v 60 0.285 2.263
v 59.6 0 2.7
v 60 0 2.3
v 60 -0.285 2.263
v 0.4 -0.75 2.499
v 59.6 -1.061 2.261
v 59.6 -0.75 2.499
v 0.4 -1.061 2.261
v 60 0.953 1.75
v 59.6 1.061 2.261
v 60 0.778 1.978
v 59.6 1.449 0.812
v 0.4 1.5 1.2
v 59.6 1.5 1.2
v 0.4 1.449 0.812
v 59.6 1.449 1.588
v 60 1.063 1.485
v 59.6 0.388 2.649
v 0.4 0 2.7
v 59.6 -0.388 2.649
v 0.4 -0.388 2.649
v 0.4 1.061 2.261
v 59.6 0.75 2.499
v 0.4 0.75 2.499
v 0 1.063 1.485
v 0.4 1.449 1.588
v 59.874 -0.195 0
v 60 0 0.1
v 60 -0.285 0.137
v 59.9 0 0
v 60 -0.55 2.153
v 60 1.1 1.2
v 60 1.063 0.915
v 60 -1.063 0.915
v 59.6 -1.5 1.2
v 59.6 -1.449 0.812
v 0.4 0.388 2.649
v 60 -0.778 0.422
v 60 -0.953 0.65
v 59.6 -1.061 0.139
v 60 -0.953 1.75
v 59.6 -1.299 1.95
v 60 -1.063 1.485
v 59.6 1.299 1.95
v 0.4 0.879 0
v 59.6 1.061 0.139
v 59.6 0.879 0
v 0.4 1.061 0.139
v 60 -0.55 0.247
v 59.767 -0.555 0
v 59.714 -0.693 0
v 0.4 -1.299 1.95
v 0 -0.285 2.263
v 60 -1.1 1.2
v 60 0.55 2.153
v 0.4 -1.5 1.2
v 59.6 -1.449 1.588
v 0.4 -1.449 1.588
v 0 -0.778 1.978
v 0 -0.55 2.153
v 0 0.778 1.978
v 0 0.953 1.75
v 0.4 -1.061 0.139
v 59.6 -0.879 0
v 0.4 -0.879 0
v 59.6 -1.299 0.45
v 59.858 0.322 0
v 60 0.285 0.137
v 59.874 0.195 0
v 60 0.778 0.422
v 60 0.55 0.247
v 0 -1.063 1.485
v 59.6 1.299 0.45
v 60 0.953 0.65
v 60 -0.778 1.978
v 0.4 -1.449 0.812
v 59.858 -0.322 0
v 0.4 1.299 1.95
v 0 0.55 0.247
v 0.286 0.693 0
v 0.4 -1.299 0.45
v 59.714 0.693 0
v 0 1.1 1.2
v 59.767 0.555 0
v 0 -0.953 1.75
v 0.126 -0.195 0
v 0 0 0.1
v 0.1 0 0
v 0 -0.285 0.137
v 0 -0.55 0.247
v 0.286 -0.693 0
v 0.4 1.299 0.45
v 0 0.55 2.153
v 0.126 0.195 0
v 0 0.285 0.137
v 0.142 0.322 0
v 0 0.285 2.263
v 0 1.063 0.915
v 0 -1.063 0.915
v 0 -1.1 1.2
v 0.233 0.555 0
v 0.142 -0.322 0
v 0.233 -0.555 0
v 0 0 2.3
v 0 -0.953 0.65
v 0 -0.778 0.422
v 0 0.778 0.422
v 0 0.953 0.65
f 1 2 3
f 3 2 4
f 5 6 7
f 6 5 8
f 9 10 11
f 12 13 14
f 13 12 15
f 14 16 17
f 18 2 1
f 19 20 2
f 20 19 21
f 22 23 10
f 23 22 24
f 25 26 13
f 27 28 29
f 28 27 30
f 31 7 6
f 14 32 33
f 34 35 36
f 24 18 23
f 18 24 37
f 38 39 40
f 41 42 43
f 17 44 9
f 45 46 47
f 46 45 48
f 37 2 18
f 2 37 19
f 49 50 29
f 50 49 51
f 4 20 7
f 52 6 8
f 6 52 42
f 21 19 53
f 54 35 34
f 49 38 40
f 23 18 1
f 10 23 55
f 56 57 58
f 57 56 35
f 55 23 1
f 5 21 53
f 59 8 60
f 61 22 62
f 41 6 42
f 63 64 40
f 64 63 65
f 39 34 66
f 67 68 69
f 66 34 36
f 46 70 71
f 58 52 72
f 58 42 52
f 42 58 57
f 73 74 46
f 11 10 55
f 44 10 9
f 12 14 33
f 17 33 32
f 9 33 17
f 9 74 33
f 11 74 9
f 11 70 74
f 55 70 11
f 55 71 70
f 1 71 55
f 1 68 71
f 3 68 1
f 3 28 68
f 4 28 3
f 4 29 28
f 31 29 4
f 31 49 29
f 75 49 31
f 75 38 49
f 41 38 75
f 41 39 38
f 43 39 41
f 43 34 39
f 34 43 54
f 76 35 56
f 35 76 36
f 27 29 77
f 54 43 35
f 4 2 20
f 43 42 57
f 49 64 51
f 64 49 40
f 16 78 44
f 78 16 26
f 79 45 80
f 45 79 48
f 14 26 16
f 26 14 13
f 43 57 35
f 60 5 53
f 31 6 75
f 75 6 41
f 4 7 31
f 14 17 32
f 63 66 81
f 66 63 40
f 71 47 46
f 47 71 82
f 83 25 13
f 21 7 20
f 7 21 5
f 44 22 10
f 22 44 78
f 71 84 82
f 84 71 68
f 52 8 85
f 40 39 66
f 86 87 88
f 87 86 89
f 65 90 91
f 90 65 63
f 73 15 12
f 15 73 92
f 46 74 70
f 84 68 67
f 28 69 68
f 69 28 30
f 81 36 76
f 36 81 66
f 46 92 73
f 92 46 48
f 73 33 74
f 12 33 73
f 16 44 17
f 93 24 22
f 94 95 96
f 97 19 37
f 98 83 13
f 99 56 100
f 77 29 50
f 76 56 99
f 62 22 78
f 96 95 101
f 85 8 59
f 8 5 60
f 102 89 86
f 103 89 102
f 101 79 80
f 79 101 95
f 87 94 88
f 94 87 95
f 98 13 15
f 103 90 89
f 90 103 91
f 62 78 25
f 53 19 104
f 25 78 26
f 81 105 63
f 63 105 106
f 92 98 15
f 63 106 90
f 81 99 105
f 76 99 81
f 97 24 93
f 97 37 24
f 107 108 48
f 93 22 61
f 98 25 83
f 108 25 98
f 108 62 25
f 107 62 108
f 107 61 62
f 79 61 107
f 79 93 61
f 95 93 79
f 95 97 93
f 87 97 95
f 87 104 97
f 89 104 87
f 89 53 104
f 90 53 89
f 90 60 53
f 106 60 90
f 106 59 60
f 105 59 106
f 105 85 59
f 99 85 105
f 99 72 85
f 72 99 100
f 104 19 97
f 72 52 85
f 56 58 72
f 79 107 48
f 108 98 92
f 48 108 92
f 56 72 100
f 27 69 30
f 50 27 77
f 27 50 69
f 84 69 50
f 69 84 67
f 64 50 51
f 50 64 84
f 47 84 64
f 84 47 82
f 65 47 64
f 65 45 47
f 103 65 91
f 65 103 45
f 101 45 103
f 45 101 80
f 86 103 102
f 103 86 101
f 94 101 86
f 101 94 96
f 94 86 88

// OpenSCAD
// file: ../stem_core.scad
// =====================================================================
//  stem_core.scad — shared geometry helpers for every STEM_KIT part.
// =====================================================================
include <../PARAMETERS/config.scad>
// =====================================================================

// ---------- rounded / chamfered prisms --------------------------------

// Rounded rectangle (2D), centred.
module rrect(size, r) {
    rr = min(r, min(size[0], size[1]) / 2 - 0.01);
    offset(r = rr) square([size[0] - 2 * rr, size[1] - 2 * rr], center = true);
}

// Box with rounded vertical edges, chamfered bottom edge (elephant-foot
// relief) and rounded-ish (chamfered) top edge. Sits on z = 0, centred XY.
module rbox(size, r = 2, top = edge_r, bottom = chamfer) {
    h = size[2];
    hull() {
        linear_extrude(0.01) rrect([size[0] - 2 * bottom, size[1] - 2 * bottom], max(r - bottom, 0.1));
        translate([0, 0, bottom]) linear_extrude(h - bottom - top) rrect([size[0], size[1]], r);
        translate([0, 0, h - 0.01]) linear_extrude(0.01) rrect([size[0] - 2 * top, size[1] - 2 * top], max(r - top, 0.1));
    }
}

// Cylinder with chamfered/rounded top and bottom edges (safe hubs, knobs).
module rcyl(d, h, top = edge_r, bottom = chamfer) {
    rotate_extrude() polygon([
        [0, 0], [d / 2 - bottom, 0], [d / 2, bottom],
        [d / 2, h - top], [d / 2 - top, h], [0, h]
    ]);
}

// Stadium (slot / rounded bar) 2D between two points on the X axis.
module stadium2d(len, w) {
    hull() { circle(d = w); translate([len, 0]) circle(d = w); }
}

// ---------- holes ------------------------------------------------------

// Vertical through hole with small top/bottom chamfers.
module vhole(d = grid_hole_d, h = 50, ch = 0.4) {
    translate([0, 0, -h / 2]) cylinder(d = d, h = h);
}

// Horizontal hole along +Y, printable without supports (teardrop tip up).
module teardrop_y(d, len, center = true) {
    translate([0, center ? -len / 2 : 0, 0]) rotate([-90, 0, 0])
        linear_extrude(len) teardrop2d(d);
}
module teardrop_x(d, len, center = true) {
    translate([center ? -len / 2 : 0, 0, 0]) rotate([0, 90, 0]) rotate([0, 0, -90])
        linear_extrude(len) teardrop2d(d);
}
// 2D teardrop: circle + 45° roof pointing "up" in the final part (+Z).
// After rotate([-90,0,0]) local +Y becomes -Z, so the roof points to -Y here.
module teardrop2d(d) {
    r = d / 2;
    union() {
        circle(d = d);
        polygon([[-r * sqrt(2) / 2, -r * sqrt(2) / 2], [0, -r * sqrt(2)], [r * sqrt(2) / 2, -r * sqrt(2) / 2]]);
    }
}

// Hex nut pocket (flat sides parallel to X), opening at z = 0 going +Z.
module nut_pocket(depth = nut_pocket_depth, af = nut_pocket_af) {
    cylinder(d = af / cos(30), h = depth, $fn = 6);
}

// Side-entry nut slot: nut plane is XY, slot opens toward +dir (X).
// Centred on the screw axis (Z), slot height nut_slot_t, runs out `len`.
module nut_slot_x(len = 10, af = nut_pocket_af, t = nut_slot_t) {
    translate([0, 0, -t / 2]) hull() {
        cylinder(d = af / cos(30), h = t, $fn = 6);
        translate([len, 0, 0]) cylinder(d = af / cos(30), h = t, $fn = 6);
    }
}

// Counterbored clearance hole from top surface at height `top` downward.
module cbore(top, depth, d = counterbore_d) {
    translate([0, 0, top - depth]) cylinder(d = d, h = depth + 20);
    translate([0, 0, -20]) cylinder(d = grid_hole_d, h = top + 40);
}

// Grid of vertical holes: nx x ny, pitch grid_pitch, first hole centred
// at `origin` (XY). Used by every plate.
module grid_holes(nx, ny, origin = [0, 0], h = 100, d = grid_hole_d) {
    for (i = [0 : nx - 1], j = [0 : ny - 1])
        translate([origin[0] + i * grid_pitch, origin[1] + j * grid_pitch, 0]) vhole(d, h);
}

// Slot (for adjustable mounting) along X, length = travel.
module slot_x(travel, d = grid_hole_d, h = 100) {
    translate([-travel / 2, 0, -h / 2]) linear_extrude(h) stadium2d(travel, d);
}

// ---------- shaft bores ------------------------------------------------

// 2D bore profile: round, or D if shaft_flat > 0.
module bore2d(d) {
    if (shaft_flat > 0)
        intersection() { circle(d = d); translate([-d, -d / 2]) square([2 * d, d - shaft_flat + (d - shaft_diameter) / 2]); }
    else circle(d = d);
}

// Standard HUB: cylinder hub_d x hub_h standing on z = z0, with bore,
// radial M3 set screw at mid height and a captive-nut slot from the top.
// Call inside difference() for the cut-outs: hub_body()/hub_cuts().
module hub_body(z0, d = hub_d, h = hub_h) {
    translate([0, 0, z0]) rcyl(d, h, top = 0.8, bottom = 0);
}
module hub_cuts(z0, total_h, d = hub_d, h = hub_h, bore = shaft_fixed_bore, set_screw = true, screw_angle = 0) {
    // bore through everything
    translate([0, 0, -1]) linear_extrude(total_h + 2) bore2d(bore);
    // entry chamfer on bore
    translate([0, 0, total_h - 0.6]) cylinder(d1 = bore, d2 = bore + 1.2, h = 0.61);
    translate([0, 0, -0.01]) cylinder(d1 = bore + 1.2, d2 = bore, h = 0.6);
    if (set_screw) rotate([0, 0, screw_angle]) {
        zs = z0 + h / 2;
        // radial screw hole (teardrop, prints without support)
        translate([0, 0, zs]) teardrop_x(screw_clear_d, d, center = false);
        // captive nut slot, entered from the hub top face
        nr = bore / 2 + (d / 2 - bore / 2) / 2;       // radial position of nut
        translate([nr - nut_slot_t / 2, -nut_pocket_af / 2, zs - nut_pocket_af / cos(30) / 2 - 0.1])
            cube([nut_slot_t, nut_pocket_af, total_h + 10]);   // open to the hub top face
    }
}

// ---------- labels -----------------------------------------------------

// Engrave text into a top surface at height z (depth 0.6 = 3 layers).
module engrave(txt, size = 5, z = 0, depth = 0.6, halign = "center") {
    translate([0, 0, z - depth]) linear_extrude(depth + 1)
        text(txt, size = size, font = "Liberation Sans:style=Bold", halign = halign, valign = "center");
}

// ---------- misc -------------------------------------------------------

function grid_snap(v) = ceil(v / grid_pitch) * grid_pitch;
// file: ../../PARAMETERS/config.scad
// =====================================================================
//  STEM_KIT — CENTRAL PARAMETER FILE  ("ForgeGrid" mechanical standard)
// ---------------------------------------------------------------------
//  Every part in the library includes this file. Change a value here,
//  run `python3 tools/build.py`, and the whole library regenerates.
//  All dimensions in millimetres.
// =====================================================================

// ---------------------------------------------------------------------
// 1. PRINTER / PROCESS
// ---------------------------------------------------------------------
nozzle          = 0.4;
layer_height    = 0.2;
tolerance       = 0.2;    // sliding clearance per side (tune with STEM_TOLERANCE_TEST)
press_allow     = 0.05;   // extra for press fits (bores that should grip)
min_wall        = 1.6;    // never go below this
wall_thickness  = 2.4;    // preferred wall (6 perimeters @ 0.4)
edge_r          = 1.0;    // rounding of exposed edges (child safety)
chamfer         = 0.6;    // bottom-edge chamfer (elephant-foot relief)

$fa = 6;                  // facet angle
$fs = 0.4;                // facet size

// ---------------------------------------------------------------------
// 2. GRID  (the heart of the ecosystem)
// ---------------------------------------------------------------------
//  Holes sit on a 10 mm lattice, 5 mm in from every plate edge, so
//  plates placed side by side keep one continuous lattice.
grid_pitch            = 10;
plate_size            = 100;   // universal base plate (square)
plate_thickness       = 6;     // base plates, rails, chassis
foot_thickness        = 4;     // flange / foot of every mount
//  => standard joint: 4 mm foot + 6 mm plate = M3 x 10 screw, nut in
//     the hex pocket under the plate. One screw length does 90 % of joints.

// ---------------------------------------------------------------------
// 3. FASTENERS (M3 everywhere: one screwdriver, one nut)
// ---------------------------------------------------------------------
screw_size            = 3;
screw_clear_d         = 3.4;   // clearance hole (also the grid hole)
grid_hole_d           = screw_clear_d;
screw_tap_d           = 2.6;   // hole a screw self-taps into
screw_head_d          = 5.7;   // ISO 7380 BUTTON head = kit standard (low, rounded, child-safe)
screw_head_h          = 1.65;
counterbore_d         = 6.4;
nut_af                = 5.5;   // M3 nut across flats
nut_thick             = 2.4;
nut_pocket_af         = nut_af + 0.35;
nut_pocket_depth      = 3.0;   // pocket under plates (nut sits flush)
nut_slot_t            = nut_thick + 0.4;  // side-entry slot thickness
set_screw_len         = 6;     // M3 x 6 grub screw for hubs

// ---------------------------------------------------------------------
// 4. SHAFTS
// ---------------------------------------------------------------------
//  Default: 3 mm steel rod (silver steel / stainless). Printed shafts
//  are provided for light-duty use. Alternative systems: set
//  shaft_diameter = 4 or 5 and rebuild.
shaft_diameter        = 3;
shaft_flat            = 0;     // >0 : D-shaft, flat depth (e.g. 0.5)
shaft_fixed_bore      = shaft_diameter + 0.15;  // hub bore (set-screw locked)
shaft_free_bore       = shaft_diameter + 0.4;   // free-spinning bore / bushing
shaft_lengths         = [40, 60, 80, 100, 120];

//  Horizontal shafts: all pillow blocks, motor mounts and axle mounts
//  put their axis at this height above the surface they are bolted to,
//  so any two of them on the grid are automatically coaxial/parallel.
axis_height           = 17;
axis_height_high      = 37;    // = axis_height + 2 pitches (pulleys, big wheels)

// ---------------------------------------------------------------------
// 5. BEARINGS
// ---------------------------------------------------------------------
bearing_size          = [5, 16, 5];   // 625 : bore, OD, width (default housing)
bearing_small         = [3, 10, 4];   // 623 : fits 3 mm shafts via adapter ring
bearing_pocket_d      = bearing_size[1] + 0.15;

// ---------------------------------------------------------------------
// 6. GEARS
// ---------------------------------------------------------------------
//  Module 2 + tooth counts that are multiples of 10  =>  centre distance
//  = (z1+z2) mm is ALWAYS a multiple of 10  =>  ANY two gears mesh when
//  their shafts sit in grid holes. (3-4-5 diagonals also work: 50 mm.)
gear_module           = 2;
gear_pressure_angle   = 20;
gear_width            = 6;
gear_backlash         = 0.30;  // total circular backlash per mesh
gear_clearance_k      = 0.25;  // root clearance = k * module
gear_teeth_set        = [10, 20, 30, 40];
//  Gearbox frame: two frame plates, outer faces 60 mm apart (on grid),
//  48 mm gap = three gear levels (A, M, B).
frame_gap             = 48;
hub_d                 = 14;
hub_h                 = 7;

// ---------------------------------------------------------------------
// 7. WHEELS / PULLEYS
// ---------------------------------------------------------------------
wheel_diameter        = 60;
wheel_width           = 10;
axle_diameter         = shaft_diameter;
oring_cs              = 3.0;    // O-ring cross-section used as tyre / belt
belt_cs               = 2.5;    // O-ring / round-belt cord for pulleys
pulley_sizes          = [20, 40, 60];  // effective (belt-line) diameters

// ---------------------------------------------------------------------
// 8. MOTORS (130-size toy / solar motor is the default)
// ---------------------------------------------------------------------
motor_size            = [20.2, 15.2, 25.2]; // body dia, across-flats, length
motor_d               = motor_size[0];
motor_flat            = motor_size[1];
motor_len             = motor_size[2];
motor_boss_d          = 6.2;
motor_boss_h          = 1.6;
motor_shaft_d         = 2.0;
motor_shaft_len       = 8.5;   // beyond boss
motor_shaft_bore      = 1.9;   // press fit onto 2 mm motor shaft

// ---------------------------------------------------------------------
// 9. SOLAR PANEL (bought, not printed) — frame is parametric
// ---------------------------------------------------------------------
solar_panel_size      = [110, 69, 3.0];  // 5 V 1 W epoxy panel (common)
solar_panel_clear     = 0.6;

// ---------------------------------------------------------------------
// 10. ELECTRONICS
// ---------------------------------------------------------------------
mounting_hole_spacing = grid_pitch;   // everything bolts to the grid
electronics_slot_w    = screw_clear_d;
led_hole_d            = 5.1;
buzzer_hole_d         = 12.2;

// ---------------------------------------------------------------------
// 11. SAFETY LIMITS (checked by tools/qc.py)
// ---------------------------------------------------------------------
max_part_voltage      = 12;    // nothing in this kit uses more
min_rim_thickness     = 2.0;   // blades/links: no edge thinner than this
finger_gap_max        = 6;     // guard openings smaller than a child's finger
// main file
// =====================================================================
//  PART: printed shaft — COMMON/shafts
//  Ø3 mm (shaft_diameter) printed shaft for light-duty builds. The kit
//  standard is 3 mm STEEL rod (see BOM); printed shafts are a stand-in
//  when steel is not available. A 0.3 mm flat on the underside makes it
//  printable lying down and gives set screws something to bite on.
//  Print: lying flat, 100 % infill, 0.12–0.16 mm layers recommended.
// =====================================================================
include <../../PARAMETERS/config.scad>
use <../stem_core.scad>

length = 60;
printed_shaft(length);

module printed_shaft(L) {
    d = shaft_diameter;
    flat = 0.3;
    c = 0.4;
    translate([0, 0, d / 2 - flat]) rotate([0, 90, 0]) difference() {
        rotate_extrude() polygon([[0, 0], [d / 2 - c, 0], [d / 2, c], [d / 2, L - c], [d / 2 - c, L], [0, L]]);
        translate([d / 2 - flat, -d, -1]) cube([d, 2 * d, L + 2]);
    }
}
